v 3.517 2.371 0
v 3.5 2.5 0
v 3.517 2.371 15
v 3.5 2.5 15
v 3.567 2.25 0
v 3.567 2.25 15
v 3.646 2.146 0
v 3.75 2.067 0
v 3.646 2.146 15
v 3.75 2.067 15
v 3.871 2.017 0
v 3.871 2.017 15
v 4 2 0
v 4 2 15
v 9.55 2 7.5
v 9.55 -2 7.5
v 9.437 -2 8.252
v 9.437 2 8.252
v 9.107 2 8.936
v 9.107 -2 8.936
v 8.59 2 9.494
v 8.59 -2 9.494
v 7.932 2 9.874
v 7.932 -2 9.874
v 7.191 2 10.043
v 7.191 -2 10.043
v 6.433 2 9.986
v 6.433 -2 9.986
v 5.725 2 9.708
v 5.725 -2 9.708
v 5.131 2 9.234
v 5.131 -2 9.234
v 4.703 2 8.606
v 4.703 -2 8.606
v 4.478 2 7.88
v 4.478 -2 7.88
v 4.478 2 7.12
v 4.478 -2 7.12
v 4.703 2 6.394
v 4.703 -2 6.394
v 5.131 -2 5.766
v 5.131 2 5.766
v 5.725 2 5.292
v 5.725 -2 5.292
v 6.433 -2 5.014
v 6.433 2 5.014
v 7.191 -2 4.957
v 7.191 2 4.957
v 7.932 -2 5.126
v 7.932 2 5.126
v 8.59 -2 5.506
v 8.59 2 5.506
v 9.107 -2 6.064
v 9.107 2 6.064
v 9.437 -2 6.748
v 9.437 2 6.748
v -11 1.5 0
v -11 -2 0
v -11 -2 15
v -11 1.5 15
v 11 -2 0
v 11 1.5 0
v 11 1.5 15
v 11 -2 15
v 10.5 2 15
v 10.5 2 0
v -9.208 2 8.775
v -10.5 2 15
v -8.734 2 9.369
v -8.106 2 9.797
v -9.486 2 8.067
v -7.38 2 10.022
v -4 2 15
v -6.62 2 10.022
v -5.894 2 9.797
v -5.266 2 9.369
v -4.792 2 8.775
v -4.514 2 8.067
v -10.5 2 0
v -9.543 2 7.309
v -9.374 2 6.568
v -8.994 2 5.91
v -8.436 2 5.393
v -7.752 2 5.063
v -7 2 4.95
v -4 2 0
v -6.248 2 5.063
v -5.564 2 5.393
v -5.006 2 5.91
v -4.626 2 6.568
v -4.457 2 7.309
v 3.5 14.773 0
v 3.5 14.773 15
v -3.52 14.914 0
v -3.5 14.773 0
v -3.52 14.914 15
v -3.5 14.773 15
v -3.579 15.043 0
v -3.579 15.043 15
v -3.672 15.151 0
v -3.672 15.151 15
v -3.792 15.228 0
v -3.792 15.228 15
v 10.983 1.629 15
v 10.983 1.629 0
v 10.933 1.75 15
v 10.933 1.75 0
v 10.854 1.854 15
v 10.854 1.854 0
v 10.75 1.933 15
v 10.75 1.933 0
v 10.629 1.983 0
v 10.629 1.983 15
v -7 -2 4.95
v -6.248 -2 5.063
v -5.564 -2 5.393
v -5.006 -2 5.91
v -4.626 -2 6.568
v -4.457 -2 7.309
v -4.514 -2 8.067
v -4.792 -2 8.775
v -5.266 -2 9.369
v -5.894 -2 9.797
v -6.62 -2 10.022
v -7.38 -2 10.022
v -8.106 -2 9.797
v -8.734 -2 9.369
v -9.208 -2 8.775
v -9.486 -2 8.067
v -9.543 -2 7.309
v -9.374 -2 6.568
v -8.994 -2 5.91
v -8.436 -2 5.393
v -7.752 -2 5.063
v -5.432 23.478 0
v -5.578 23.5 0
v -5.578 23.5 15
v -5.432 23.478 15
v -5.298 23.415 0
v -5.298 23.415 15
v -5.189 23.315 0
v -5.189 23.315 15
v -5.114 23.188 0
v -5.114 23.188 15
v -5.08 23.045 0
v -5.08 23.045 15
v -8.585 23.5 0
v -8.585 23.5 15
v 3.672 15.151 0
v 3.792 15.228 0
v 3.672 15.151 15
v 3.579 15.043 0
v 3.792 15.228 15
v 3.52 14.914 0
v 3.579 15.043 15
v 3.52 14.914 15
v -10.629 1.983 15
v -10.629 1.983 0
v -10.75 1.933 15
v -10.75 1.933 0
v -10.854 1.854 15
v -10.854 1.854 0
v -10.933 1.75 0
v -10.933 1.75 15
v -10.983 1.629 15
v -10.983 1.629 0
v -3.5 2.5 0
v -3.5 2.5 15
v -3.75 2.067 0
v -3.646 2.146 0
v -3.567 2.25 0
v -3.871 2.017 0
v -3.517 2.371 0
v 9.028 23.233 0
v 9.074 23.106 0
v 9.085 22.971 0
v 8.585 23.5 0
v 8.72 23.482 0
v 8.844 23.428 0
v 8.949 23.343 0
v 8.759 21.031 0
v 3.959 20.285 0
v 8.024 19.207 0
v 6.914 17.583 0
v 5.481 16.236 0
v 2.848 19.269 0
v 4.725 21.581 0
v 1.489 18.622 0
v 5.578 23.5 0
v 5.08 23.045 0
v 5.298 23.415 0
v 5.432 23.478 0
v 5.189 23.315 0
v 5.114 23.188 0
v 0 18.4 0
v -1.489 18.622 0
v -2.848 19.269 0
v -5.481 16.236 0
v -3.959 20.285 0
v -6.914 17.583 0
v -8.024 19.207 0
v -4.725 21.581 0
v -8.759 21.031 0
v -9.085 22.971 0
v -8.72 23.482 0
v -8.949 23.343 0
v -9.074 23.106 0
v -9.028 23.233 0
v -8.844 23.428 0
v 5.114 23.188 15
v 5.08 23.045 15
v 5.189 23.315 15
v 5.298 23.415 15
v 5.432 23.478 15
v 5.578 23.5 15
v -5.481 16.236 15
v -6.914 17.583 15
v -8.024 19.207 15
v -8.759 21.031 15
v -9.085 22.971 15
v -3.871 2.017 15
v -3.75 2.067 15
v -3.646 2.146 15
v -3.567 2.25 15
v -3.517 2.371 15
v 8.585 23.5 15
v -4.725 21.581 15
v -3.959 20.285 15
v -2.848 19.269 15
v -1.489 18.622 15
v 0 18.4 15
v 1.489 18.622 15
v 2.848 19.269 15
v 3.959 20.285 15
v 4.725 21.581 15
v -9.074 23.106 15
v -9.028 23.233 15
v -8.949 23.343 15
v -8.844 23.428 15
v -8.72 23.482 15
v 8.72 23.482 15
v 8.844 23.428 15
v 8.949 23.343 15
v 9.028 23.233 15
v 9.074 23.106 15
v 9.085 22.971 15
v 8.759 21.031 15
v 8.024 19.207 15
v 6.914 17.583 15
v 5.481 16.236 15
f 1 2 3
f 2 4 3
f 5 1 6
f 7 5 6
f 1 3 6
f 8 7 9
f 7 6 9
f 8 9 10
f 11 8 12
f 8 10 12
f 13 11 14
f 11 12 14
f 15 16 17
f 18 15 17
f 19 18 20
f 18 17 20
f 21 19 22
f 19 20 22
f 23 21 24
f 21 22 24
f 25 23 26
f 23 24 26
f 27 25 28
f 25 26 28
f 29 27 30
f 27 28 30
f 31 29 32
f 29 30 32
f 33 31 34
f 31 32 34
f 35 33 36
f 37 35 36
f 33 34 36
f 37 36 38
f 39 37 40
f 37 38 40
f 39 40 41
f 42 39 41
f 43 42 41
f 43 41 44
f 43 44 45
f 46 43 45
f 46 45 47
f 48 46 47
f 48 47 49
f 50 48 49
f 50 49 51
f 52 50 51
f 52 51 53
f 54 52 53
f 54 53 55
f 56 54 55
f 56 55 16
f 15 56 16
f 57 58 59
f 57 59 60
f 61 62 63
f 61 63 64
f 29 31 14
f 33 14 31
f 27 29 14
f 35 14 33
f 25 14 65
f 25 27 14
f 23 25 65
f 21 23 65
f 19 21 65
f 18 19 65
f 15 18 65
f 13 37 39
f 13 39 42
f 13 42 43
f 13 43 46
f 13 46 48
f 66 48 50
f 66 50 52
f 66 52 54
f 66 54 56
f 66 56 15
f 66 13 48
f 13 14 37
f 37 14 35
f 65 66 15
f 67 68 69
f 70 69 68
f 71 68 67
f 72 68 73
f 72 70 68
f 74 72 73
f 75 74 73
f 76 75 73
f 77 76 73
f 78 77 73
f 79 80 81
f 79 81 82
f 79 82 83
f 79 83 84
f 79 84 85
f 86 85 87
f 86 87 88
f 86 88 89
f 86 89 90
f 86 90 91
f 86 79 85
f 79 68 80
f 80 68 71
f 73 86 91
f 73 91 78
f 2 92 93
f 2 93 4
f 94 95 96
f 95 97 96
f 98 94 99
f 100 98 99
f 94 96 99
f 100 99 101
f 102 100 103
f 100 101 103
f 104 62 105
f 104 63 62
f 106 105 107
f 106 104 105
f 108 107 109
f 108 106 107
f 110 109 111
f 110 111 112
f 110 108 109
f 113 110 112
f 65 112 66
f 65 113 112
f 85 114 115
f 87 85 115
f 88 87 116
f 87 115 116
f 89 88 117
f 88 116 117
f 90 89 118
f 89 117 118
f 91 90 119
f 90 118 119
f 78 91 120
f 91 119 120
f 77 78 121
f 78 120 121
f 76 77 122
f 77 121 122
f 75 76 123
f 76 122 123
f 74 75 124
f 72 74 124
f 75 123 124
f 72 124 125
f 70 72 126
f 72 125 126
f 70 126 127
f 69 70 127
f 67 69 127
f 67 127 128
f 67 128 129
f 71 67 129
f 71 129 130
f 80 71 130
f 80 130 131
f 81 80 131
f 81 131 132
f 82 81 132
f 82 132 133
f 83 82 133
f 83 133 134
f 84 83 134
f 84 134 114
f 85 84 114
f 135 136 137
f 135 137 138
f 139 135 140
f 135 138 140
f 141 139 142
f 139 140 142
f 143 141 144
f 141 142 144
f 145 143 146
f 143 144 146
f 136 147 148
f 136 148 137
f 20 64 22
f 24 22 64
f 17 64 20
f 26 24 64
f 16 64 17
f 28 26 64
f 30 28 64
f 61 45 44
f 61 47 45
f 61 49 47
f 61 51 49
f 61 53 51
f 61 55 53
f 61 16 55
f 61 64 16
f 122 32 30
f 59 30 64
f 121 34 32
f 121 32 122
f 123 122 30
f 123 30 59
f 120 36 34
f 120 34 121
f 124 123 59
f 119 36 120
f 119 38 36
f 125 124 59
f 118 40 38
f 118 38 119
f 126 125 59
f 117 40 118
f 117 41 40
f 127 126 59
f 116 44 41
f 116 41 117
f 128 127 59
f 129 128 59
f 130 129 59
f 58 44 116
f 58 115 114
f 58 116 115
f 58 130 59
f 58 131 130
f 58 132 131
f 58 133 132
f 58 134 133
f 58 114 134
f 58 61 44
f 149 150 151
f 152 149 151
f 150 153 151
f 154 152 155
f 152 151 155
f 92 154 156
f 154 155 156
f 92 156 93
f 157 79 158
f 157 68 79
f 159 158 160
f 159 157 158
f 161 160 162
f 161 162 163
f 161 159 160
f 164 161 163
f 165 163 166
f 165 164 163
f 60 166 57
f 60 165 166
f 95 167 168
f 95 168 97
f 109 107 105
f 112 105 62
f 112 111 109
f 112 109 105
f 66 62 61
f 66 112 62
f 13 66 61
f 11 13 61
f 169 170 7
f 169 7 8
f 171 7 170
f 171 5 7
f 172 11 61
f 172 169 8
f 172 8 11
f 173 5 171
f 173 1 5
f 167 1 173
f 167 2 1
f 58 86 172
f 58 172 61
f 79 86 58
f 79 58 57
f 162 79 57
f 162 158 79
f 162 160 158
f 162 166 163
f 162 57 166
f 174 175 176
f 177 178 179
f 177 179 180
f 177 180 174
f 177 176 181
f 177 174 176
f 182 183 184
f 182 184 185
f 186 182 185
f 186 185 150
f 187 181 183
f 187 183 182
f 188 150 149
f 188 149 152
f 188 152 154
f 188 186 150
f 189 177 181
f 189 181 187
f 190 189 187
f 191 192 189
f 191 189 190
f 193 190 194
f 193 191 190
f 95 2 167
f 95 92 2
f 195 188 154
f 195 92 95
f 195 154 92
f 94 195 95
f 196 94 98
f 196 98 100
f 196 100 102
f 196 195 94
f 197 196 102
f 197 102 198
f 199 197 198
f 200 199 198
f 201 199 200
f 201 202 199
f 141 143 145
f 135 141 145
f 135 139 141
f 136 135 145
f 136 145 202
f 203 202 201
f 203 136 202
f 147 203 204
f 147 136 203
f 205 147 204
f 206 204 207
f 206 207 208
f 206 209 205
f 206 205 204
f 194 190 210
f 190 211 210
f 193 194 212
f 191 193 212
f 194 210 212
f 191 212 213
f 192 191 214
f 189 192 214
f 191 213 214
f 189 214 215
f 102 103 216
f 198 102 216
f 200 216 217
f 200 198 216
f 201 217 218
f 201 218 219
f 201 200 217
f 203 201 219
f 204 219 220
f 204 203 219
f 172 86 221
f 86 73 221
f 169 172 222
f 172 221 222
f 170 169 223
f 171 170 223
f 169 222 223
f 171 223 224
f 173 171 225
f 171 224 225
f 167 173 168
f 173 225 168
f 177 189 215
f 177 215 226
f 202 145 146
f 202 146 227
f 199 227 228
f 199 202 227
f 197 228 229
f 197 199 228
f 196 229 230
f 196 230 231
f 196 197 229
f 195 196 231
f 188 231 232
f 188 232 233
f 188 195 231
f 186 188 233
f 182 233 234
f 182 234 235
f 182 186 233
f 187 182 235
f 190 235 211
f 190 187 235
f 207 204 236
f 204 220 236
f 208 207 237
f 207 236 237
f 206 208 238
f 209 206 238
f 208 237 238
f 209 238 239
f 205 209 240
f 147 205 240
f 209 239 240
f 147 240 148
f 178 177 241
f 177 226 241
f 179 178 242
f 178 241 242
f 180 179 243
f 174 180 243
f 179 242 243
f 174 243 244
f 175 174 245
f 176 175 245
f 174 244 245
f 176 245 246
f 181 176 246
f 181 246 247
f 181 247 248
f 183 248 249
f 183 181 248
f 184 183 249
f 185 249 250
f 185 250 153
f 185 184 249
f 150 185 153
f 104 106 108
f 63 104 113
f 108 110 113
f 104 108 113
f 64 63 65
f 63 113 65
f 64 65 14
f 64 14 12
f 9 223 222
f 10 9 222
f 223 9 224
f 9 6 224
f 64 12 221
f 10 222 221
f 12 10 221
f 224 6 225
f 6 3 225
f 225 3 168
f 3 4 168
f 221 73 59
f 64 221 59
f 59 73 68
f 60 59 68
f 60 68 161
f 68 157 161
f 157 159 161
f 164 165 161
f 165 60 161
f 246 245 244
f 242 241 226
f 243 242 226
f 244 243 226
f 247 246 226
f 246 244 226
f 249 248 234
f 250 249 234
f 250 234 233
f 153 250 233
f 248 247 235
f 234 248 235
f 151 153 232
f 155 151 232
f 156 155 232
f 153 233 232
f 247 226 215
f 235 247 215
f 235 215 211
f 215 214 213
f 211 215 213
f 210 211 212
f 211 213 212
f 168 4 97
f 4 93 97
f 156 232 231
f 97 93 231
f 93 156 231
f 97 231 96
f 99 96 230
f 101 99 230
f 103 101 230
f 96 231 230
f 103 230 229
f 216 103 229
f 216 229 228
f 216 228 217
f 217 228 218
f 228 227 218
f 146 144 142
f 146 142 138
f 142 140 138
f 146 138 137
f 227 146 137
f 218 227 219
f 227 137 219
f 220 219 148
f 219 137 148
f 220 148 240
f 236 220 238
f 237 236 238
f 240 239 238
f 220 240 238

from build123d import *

# Parameters (mm, degrees)
SALIENTE_EXTRUIR1_DEPTH = 15
REDONDEO1_R             = 0.5
REDONDEO2_R             = 0.5
CROQUIS3_R              = 2.55
CORTAR_EXTRUIR1_DEPTH   = 6


with BuildPart() as part:
    # Croquis1 → Saliente-Extruir1 (new body)
    with BuildSketch(Plane.XY):
        with BuildLine():
            Line((-11, 2), (-3.5, 2))
            Line((-3.5, 2), (-3.5, 15.1))
            ThreePointArc((-3.5, 15.1), (-7.571657678, 18.452228214), (-9.1, 23.5))
            Line((-9.1, 23.5), (-5.1, 23.5))
            ThreePointArc((-5.1, 23.5), (0, 18.4), (5.1, 23.5))
            Line((5.1, 23.5), (9.1, 23.5))
            ThreePointArc((9.1, 23.5), (7.571657678, 18.452228214), (3.5, 15.1))
            Line((3.5, 15.1), (3.5, 2))
            Line((3.5, 2), (11, 2))
            Line((11, 2), (11, -2))
            Line((11, -2), (-11, -2))
            Line((-11, -2), (-11, 2))
        make_face()
    extrude(amount=SALIENTE_EXTRUIR1_DEPTH)

    # Redondeo1
    redondeo1_edges = [part.edges().sort_by_distance(p)[0] for p in [
        (-3.5, 2, 7.5),
        (-3.5, 15.1, 7.5),
        (3.5, 15.1, 7.5),
        (3.5, 2, 7.5),
    ]]
    fillet(redondeo1_edges, radius=REDONDEO1_R)

    # Redondeo2
    redondeo2_edges = [part.edges().sort_by_distance(p)[0] for p in [
        (-11, 2, 7.5),
        (-9.1, 23.5, 7.5),
        (-5.1, 23.5, 7.5),
        (5.1, 23.5, 7.5),
        (9.1, 23.5, 7.5),
        (11, 2, 7.5),
    ]]
    fillet(redondeo2_edges, radius=REDONDEO2_R)

    # Croquis3 → Cortar-Extruir1 (cut)
    with BuildSketch(Plane.XZ.offset(2)):
        with Locations(Location((-7, 7.5, 0), (0, 0, 270))):
            Circle(CROQUIS3_R)
        with Locations((7, 7.5)):
            Circle(CROQUIS3_R)
    extrude(amount=-CORTAR_EXTRUIR1_DEPTH, mode=Mode.SUBTRACT)


solid = part.part
